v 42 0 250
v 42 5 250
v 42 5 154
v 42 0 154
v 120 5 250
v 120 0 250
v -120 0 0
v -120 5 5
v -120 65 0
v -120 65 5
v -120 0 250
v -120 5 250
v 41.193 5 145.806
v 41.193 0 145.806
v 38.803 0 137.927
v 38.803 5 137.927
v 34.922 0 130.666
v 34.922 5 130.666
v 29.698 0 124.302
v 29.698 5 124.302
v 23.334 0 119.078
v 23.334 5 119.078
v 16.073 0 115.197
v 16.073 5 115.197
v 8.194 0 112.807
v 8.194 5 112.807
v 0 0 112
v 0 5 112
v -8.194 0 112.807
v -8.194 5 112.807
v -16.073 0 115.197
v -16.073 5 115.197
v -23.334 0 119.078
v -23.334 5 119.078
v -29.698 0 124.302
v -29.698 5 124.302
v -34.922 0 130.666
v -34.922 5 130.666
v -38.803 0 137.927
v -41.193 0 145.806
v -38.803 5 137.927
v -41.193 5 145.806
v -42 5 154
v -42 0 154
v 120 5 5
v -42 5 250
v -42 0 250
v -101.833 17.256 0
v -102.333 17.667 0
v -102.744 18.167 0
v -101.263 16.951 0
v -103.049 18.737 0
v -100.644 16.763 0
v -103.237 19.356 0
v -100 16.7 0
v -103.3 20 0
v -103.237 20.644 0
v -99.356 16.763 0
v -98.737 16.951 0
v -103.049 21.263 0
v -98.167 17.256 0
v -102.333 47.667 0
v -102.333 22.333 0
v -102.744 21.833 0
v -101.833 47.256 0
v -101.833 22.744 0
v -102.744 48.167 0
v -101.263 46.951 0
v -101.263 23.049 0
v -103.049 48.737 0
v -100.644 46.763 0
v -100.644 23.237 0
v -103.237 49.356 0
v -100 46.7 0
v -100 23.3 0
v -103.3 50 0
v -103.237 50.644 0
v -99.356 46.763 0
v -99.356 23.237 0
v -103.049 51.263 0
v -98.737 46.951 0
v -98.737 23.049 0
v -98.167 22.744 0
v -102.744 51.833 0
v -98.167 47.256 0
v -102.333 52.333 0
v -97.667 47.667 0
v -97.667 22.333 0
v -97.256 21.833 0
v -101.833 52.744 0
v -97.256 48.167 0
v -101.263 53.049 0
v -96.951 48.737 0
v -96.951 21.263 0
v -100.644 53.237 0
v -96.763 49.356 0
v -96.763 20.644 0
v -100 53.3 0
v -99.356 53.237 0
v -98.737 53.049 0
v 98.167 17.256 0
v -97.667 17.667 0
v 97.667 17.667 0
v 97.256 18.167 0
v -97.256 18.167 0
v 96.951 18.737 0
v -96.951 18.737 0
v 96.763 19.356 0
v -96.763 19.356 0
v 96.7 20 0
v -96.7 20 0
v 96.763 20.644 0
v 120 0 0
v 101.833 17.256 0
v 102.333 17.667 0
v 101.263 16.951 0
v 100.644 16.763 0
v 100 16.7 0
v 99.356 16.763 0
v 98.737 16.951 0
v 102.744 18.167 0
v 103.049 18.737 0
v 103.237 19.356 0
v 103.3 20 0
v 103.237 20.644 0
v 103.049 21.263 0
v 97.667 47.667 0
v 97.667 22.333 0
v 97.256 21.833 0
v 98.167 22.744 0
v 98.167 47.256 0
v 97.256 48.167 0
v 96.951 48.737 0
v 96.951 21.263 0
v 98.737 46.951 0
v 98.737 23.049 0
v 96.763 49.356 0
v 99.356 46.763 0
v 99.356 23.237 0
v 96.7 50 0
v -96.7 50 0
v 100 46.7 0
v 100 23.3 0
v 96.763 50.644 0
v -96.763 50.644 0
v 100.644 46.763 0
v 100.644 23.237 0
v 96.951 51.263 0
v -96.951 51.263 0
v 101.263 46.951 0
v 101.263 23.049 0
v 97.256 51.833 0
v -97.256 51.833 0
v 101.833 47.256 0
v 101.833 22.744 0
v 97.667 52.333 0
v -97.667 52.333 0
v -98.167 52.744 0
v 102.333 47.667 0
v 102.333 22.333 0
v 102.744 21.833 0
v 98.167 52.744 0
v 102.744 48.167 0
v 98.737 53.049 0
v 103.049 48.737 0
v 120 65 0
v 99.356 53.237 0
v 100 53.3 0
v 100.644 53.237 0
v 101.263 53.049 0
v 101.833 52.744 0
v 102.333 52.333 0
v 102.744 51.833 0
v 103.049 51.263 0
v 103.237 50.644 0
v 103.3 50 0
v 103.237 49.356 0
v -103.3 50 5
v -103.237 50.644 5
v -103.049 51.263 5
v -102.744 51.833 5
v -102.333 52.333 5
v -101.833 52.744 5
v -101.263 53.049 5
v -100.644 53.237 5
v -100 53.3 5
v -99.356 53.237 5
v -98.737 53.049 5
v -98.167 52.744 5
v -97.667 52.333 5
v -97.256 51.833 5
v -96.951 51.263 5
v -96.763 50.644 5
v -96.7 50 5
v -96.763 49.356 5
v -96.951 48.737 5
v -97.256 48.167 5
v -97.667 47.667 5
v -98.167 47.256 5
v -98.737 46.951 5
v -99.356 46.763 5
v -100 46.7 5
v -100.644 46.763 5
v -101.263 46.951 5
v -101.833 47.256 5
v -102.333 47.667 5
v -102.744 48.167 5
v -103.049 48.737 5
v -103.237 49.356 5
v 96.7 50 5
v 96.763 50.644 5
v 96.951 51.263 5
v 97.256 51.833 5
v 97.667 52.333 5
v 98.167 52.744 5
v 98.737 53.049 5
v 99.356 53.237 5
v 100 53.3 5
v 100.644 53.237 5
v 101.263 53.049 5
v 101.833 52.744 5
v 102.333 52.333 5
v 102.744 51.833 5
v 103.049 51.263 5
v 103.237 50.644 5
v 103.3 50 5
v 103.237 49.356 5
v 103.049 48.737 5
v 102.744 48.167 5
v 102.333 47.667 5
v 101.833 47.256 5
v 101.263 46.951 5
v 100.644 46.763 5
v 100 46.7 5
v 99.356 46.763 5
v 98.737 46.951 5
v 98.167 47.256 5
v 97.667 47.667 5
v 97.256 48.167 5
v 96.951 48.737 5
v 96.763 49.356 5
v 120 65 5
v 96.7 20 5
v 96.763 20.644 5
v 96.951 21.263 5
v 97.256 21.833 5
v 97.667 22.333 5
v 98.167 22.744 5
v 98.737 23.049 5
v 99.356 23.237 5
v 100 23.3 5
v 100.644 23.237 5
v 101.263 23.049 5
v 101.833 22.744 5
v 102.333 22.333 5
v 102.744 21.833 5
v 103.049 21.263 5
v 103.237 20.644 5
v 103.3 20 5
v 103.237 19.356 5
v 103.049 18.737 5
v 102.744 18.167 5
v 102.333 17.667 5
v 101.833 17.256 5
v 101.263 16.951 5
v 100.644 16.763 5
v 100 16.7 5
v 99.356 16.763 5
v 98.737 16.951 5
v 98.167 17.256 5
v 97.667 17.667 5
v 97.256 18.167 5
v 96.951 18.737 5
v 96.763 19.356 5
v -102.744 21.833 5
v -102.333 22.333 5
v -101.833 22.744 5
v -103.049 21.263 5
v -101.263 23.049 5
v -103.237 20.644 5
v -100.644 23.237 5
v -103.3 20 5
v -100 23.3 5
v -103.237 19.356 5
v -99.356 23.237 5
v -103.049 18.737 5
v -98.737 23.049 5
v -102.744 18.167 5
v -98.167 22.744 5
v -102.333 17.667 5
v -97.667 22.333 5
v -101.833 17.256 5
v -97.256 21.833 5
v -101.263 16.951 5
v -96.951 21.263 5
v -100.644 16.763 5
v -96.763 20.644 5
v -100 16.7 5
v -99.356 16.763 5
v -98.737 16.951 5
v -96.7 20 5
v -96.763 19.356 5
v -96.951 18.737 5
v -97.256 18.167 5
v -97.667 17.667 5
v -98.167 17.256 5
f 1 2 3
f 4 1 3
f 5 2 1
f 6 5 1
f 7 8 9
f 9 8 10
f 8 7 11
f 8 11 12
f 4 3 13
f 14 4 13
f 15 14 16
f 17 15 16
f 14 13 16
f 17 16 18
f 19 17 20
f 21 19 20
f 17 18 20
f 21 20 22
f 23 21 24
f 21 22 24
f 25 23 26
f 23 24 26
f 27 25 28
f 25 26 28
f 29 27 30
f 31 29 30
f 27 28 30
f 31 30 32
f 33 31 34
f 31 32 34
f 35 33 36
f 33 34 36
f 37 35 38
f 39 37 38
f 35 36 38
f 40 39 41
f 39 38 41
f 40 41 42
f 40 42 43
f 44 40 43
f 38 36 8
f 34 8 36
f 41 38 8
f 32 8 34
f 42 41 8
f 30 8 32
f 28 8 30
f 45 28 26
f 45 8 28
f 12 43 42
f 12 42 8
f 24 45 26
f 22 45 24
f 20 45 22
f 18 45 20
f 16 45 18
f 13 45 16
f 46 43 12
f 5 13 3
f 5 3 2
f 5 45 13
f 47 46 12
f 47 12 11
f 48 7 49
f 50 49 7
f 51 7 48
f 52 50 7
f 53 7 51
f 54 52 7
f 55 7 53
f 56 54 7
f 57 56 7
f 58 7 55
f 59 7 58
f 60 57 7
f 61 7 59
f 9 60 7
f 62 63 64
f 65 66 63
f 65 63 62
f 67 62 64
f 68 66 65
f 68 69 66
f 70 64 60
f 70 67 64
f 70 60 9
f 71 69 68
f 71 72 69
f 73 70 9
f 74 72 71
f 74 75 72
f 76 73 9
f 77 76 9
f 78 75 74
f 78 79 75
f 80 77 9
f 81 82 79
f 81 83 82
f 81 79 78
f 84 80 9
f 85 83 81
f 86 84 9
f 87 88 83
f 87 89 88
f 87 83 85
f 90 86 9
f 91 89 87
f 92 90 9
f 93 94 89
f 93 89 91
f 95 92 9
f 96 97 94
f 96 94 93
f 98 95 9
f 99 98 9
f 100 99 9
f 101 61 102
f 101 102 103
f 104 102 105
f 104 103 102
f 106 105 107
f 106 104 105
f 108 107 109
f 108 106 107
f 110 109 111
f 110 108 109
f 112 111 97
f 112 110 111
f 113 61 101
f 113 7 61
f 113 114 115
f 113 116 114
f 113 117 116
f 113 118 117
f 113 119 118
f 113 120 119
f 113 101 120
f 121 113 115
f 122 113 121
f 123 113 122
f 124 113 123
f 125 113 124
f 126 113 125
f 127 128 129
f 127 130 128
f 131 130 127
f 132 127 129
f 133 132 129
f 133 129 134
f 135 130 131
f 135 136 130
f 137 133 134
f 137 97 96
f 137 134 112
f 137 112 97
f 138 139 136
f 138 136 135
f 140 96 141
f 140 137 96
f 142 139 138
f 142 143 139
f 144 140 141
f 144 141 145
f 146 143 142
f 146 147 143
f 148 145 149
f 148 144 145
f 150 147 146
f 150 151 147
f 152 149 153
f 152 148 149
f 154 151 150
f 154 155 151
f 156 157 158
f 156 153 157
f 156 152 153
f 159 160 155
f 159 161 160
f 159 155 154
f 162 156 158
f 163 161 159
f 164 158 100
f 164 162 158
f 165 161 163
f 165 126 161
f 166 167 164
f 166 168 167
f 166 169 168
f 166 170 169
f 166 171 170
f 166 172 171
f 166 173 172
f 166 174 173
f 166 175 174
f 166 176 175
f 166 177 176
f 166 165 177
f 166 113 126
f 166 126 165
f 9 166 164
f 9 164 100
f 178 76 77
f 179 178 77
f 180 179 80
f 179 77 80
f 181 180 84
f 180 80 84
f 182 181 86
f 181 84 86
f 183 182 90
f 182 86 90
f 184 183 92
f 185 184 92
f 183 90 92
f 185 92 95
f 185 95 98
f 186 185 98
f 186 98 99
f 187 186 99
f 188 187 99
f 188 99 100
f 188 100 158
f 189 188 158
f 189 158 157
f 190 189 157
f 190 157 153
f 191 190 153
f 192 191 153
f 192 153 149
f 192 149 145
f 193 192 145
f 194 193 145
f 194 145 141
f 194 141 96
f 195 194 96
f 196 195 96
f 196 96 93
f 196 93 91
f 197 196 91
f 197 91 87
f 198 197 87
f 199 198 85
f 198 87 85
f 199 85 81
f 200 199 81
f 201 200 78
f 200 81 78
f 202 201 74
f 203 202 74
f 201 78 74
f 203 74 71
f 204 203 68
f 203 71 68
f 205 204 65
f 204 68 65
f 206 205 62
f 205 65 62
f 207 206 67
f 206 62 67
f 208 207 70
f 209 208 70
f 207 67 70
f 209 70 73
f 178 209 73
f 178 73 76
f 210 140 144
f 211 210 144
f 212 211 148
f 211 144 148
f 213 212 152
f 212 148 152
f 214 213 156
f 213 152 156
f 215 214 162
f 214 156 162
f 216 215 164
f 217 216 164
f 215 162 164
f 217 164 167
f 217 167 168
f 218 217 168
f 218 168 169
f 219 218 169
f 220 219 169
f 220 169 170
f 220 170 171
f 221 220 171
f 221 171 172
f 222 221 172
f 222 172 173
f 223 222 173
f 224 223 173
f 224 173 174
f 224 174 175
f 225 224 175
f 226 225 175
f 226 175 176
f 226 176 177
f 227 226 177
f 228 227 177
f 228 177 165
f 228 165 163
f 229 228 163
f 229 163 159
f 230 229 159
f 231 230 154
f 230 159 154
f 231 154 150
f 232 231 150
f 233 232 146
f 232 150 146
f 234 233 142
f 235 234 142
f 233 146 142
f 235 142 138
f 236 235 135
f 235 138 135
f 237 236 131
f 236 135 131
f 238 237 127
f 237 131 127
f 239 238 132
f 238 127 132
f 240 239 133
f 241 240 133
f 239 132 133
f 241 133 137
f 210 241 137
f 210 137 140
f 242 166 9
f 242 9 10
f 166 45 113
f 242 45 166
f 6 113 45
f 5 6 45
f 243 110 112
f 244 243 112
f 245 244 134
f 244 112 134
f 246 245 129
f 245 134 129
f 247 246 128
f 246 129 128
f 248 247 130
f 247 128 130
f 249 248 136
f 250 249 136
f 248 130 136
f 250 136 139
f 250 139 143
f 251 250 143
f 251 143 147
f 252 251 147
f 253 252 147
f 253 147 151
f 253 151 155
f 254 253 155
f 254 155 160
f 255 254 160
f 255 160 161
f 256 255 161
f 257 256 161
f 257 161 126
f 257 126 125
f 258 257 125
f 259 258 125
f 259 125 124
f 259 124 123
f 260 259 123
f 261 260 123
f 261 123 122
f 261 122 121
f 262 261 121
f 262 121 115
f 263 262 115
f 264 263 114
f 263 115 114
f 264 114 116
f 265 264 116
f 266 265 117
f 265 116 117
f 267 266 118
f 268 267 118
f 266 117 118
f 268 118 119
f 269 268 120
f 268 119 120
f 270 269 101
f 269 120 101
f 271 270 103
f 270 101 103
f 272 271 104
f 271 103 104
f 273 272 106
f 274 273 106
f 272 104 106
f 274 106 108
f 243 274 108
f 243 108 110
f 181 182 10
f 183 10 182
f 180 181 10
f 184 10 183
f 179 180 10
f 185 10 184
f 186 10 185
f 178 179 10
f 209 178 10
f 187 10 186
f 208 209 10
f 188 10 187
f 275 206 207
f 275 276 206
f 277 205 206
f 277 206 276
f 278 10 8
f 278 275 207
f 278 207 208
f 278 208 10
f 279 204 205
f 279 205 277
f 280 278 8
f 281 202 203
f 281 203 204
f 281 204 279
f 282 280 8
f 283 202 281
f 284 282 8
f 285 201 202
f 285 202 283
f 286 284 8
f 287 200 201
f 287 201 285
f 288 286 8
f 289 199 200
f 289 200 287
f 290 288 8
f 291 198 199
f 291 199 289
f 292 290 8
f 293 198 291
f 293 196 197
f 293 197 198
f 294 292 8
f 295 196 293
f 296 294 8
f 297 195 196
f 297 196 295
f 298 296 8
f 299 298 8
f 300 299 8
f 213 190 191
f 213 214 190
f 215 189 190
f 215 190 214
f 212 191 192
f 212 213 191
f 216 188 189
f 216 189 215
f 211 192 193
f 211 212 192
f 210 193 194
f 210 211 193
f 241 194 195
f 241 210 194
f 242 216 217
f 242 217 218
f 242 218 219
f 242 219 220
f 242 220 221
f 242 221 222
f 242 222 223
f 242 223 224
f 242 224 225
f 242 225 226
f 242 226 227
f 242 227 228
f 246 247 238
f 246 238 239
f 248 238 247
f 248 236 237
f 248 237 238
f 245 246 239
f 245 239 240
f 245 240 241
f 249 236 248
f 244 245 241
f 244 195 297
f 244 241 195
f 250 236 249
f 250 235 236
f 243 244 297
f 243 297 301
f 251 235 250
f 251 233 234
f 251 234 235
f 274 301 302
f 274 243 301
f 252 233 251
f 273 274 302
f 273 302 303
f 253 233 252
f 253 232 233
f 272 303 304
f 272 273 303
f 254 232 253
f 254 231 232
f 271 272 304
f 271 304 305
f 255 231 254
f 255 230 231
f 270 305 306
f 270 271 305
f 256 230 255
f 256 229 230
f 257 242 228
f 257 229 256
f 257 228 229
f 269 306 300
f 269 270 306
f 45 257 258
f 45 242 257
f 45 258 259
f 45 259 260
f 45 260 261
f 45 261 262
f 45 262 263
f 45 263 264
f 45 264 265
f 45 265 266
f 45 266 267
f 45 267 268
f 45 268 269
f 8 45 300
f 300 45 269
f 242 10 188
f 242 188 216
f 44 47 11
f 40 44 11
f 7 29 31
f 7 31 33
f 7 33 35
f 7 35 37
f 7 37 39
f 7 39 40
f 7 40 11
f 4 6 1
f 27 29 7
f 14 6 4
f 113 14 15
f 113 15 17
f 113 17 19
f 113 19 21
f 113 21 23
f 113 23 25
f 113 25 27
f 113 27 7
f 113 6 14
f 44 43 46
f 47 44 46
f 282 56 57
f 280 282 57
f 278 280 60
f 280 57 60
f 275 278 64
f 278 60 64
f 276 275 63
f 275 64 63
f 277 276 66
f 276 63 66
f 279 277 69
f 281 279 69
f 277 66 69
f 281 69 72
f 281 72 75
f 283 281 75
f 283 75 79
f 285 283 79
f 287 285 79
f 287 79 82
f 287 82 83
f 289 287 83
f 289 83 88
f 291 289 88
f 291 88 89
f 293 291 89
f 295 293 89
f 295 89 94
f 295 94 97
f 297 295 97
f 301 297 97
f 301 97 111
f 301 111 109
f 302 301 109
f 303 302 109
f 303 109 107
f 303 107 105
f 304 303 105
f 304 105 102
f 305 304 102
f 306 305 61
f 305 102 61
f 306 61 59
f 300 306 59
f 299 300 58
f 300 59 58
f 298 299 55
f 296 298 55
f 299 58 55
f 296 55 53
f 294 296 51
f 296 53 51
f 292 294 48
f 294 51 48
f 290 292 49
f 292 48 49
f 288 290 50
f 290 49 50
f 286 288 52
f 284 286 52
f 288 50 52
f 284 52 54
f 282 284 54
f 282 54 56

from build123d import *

# Parameters (mm, degrees)
F1_DEPTH = 120
F3_DEPTH = 5
F5_D     = 6.6
F5_DEPTH = 14.4
F5_TIP   = 1.9828400428


with BuildPart() as f1:
    # F0 (on Right) → F1 (new body, symmetric)
    with BuildSketch(Plane.YZ):
        Polygon((5, 250), (0, 250), (0, 0), (65, 0), (65, 5), (5, 5), align=None)
    extrude(amount=F1_DEPTH, both=True)

    # F2 (on face) → F3 (cut, through all)
    with BuildSketch(Plane(origin=(0, 5, 0), x_dir=(-1, 0, 0), z_dir=(0, 1, 0))):
        with BuildLine():
            ThreePointArc((-42, 154), (0, 112), (42, 154))
            Line((42, 154), (42, 250))
            Line((42, 250), (-42, 250))
            Line((-42, 250), (-42, 154))
        make_face()
    extrude(amount=-F3_DEPTH, mode=Mode.SUBTRACT)

    # F5
    with Locations(Plane.XY.offset(5)):
        with Locations((-100, 20), (-100, 50), (100, 20), (100, 50)):
            Hole(F5_D / 2, depth=F5_DEPTH)
            with Locations((0, 0, -(F5_DEPTH + F5_TIP / 2))):  # 118° drill point
                Cone(0, F5_D / 2, F5_TIP, mode=Mode.SUBTRACT)


solid = f1.part
